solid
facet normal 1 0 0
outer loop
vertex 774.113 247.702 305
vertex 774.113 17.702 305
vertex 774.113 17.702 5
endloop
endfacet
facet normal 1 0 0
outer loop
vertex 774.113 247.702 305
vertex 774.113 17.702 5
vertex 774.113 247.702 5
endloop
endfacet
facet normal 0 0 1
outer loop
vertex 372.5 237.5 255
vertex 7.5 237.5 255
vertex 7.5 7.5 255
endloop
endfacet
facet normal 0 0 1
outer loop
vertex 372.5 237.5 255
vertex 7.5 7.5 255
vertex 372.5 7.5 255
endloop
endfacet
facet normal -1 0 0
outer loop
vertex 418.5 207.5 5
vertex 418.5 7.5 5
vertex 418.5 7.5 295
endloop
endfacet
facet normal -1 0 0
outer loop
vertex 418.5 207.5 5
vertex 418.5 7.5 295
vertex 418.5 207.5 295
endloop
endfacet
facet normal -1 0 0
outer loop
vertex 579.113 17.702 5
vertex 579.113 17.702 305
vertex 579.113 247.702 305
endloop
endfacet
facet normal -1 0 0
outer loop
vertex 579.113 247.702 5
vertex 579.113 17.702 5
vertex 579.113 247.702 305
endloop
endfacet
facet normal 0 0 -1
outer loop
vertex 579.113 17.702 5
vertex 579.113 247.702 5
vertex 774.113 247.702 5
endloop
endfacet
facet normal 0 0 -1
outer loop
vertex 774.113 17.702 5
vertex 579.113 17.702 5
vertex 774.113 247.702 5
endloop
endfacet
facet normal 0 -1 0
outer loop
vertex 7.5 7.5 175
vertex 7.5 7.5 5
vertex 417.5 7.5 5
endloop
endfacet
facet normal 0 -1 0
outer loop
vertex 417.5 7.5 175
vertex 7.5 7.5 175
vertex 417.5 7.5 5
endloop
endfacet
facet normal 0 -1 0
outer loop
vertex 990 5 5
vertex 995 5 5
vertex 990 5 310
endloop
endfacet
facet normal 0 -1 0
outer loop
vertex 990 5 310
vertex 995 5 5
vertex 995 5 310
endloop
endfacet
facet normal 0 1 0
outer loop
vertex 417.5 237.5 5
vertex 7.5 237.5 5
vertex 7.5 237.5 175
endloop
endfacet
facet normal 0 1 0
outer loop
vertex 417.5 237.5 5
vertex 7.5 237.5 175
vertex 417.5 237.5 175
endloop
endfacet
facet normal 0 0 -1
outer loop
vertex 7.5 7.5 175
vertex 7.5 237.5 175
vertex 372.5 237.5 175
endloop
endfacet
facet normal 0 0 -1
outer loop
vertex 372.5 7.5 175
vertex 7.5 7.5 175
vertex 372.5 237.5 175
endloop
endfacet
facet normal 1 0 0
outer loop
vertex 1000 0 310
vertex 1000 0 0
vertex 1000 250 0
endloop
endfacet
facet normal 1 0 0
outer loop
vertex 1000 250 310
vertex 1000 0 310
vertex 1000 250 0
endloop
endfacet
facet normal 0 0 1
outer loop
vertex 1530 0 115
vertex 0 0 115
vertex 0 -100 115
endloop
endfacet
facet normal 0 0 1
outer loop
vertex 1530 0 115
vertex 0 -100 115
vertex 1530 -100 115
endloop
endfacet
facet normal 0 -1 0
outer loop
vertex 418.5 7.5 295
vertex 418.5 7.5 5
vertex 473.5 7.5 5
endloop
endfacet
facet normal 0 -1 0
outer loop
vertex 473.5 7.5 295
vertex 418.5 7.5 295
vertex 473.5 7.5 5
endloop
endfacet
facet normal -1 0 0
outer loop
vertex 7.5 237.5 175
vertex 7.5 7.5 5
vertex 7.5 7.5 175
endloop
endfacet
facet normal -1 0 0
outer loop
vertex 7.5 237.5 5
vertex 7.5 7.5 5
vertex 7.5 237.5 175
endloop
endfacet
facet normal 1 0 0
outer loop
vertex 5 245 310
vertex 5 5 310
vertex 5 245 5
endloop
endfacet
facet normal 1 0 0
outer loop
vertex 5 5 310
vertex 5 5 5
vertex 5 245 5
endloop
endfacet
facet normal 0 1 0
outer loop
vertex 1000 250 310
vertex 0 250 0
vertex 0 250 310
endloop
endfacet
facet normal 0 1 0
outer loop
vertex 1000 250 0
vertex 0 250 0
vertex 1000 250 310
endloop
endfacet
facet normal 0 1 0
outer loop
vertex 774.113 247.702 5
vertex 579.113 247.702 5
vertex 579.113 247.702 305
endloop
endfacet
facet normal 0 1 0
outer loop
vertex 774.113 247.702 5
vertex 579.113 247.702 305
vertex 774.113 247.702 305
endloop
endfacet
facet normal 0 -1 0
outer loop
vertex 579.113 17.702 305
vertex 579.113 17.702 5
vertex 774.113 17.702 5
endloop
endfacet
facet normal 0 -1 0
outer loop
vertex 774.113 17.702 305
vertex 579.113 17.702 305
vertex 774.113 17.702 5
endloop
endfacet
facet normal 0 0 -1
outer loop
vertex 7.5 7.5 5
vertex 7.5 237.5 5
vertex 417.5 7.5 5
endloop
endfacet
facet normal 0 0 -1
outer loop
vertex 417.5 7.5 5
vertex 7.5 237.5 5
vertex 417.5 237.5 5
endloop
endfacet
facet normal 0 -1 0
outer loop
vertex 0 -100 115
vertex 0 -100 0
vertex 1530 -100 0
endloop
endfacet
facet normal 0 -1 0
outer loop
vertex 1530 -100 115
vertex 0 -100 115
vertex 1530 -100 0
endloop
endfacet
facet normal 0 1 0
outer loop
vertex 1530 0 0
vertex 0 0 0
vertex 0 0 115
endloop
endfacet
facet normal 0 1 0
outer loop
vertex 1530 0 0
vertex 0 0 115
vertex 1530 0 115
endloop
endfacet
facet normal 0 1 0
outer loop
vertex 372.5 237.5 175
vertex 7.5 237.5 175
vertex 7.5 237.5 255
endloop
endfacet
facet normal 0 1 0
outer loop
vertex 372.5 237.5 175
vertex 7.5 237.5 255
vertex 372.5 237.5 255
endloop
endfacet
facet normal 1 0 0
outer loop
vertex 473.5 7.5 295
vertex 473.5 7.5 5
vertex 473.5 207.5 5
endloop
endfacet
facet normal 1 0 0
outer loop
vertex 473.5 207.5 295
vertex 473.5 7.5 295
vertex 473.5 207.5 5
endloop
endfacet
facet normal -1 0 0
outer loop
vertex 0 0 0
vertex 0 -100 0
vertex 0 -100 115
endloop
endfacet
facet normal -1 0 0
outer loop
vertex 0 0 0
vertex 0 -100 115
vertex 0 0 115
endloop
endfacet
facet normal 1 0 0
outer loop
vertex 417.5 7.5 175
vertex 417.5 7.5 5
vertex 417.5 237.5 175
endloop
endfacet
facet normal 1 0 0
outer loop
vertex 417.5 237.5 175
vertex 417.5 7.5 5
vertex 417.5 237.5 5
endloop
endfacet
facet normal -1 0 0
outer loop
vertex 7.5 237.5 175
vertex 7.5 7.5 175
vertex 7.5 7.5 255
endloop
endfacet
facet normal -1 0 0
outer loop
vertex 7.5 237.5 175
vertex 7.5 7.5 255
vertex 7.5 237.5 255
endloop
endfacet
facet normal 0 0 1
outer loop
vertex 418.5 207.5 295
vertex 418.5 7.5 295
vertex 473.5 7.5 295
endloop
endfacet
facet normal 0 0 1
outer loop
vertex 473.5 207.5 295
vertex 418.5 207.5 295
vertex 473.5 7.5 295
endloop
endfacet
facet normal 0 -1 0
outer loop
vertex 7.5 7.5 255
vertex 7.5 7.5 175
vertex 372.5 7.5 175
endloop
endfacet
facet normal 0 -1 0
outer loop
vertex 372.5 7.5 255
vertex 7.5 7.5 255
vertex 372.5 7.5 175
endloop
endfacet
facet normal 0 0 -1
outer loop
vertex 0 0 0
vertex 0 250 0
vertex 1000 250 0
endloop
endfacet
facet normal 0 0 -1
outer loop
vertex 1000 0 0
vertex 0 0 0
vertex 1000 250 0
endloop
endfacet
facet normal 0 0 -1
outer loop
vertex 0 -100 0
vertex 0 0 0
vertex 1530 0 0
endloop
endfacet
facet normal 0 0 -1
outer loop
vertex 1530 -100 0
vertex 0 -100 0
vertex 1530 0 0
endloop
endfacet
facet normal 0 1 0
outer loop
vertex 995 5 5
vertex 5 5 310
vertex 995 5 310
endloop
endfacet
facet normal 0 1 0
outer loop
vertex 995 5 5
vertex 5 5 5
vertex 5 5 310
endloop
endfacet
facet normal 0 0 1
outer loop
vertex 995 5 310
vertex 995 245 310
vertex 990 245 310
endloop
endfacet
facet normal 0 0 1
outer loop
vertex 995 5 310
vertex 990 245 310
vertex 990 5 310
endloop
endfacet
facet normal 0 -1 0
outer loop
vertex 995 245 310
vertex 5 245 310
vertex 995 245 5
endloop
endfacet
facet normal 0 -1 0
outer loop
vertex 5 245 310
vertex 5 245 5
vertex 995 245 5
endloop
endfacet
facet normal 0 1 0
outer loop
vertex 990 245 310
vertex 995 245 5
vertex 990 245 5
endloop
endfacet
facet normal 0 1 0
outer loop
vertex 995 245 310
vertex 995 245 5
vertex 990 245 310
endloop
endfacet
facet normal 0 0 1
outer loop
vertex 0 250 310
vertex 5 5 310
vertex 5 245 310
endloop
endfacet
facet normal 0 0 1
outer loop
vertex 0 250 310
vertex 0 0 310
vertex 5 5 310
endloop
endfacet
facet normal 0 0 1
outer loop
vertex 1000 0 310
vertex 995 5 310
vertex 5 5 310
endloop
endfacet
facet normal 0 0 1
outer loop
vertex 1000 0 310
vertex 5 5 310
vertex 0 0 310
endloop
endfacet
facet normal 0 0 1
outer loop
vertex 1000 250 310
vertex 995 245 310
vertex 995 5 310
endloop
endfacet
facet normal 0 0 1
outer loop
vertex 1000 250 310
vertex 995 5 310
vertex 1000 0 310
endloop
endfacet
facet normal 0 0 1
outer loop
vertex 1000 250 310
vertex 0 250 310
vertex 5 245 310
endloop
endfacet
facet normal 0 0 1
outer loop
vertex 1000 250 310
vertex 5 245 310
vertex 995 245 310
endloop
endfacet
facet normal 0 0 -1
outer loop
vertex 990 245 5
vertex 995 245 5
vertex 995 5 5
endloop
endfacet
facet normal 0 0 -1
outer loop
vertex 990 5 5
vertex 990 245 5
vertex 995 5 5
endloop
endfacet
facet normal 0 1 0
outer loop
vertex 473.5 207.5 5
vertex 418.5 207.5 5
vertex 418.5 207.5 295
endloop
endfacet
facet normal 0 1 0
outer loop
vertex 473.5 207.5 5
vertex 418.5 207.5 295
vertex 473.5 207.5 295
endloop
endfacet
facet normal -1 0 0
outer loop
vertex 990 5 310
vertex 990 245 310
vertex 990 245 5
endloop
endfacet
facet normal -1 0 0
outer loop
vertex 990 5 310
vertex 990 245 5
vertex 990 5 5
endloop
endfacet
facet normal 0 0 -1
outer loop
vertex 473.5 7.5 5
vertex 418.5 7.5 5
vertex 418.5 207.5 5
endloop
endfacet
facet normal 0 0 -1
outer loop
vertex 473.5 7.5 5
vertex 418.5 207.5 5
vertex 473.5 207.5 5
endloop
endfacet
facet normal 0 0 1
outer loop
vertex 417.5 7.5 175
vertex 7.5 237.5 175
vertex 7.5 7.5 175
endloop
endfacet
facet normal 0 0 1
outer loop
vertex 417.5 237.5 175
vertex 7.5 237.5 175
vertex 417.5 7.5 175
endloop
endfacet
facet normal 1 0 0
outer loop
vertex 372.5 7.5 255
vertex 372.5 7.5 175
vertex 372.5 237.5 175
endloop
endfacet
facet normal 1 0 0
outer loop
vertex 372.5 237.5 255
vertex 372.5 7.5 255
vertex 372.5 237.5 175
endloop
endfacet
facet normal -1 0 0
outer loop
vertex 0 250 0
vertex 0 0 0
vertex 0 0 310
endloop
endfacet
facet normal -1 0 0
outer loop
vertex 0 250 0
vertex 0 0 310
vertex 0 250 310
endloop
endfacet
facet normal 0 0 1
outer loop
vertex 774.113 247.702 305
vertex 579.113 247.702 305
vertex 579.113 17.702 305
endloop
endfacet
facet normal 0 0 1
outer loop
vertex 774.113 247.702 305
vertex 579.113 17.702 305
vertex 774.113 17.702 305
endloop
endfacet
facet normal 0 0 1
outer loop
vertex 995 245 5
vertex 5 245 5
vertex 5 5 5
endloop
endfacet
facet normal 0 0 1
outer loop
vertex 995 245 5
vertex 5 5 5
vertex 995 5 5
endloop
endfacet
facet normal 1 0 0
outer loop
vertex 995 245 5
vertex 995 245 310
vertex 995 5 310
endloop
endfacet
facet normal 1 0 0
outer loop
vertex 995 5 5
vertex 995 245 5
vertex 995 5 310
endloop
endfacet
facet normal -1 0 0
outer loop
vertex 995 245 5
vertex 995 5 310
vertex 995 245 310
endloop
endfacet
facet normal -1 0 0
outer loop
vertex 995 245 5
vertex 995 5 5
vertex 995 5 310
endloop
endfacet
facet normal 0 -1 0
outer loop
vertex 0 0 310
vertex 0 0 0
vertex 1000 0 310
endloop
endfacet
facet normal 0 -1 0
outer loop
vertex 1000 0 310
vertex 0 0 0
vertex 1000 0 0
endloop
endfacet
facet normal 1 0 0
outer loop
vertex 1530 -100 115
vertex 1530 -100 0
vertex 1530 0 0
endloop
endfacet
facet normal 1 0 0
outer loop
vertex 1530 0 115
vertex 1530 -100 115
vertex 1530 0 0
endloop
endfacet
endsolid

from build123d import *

# Parameters (mm, degrees)
F0_W      = 1000
F0_H      = 250
F1_DEPTH  = 310
F2_T      = -5
F3_W      = 410
F3_H      = 230
F4_DEPTH  = 170
F5_W      = 365
F5_H      = 230
F6_DEPTH  = 80
F7_W      = 55
F7_H      = 200
F8_DEPTH  = 290
F9_W      = 195
F9_H      = 230
F10_DEPTH = 300
F11_W     = 1530
F11_H     = 100
F12_DEPTH = 115
F13_W     = 240
F13_H     = 305
F14_DEPTH = 5


with BuildPart() as f1:
    # F0 (on Top) → F1 (new body)
    with BuildSketch(Plane.XY):
        with Locations((500, 125)):
            Rectangle(F0_W, F0_H)
    extrude(amount=F1_DEPTH)

    # F2
    f2_openings = [f1.faces().sort_by_distance(p)[0] for p in [
        (500, 125, 310),
    ]]
    offset(amount=F2_T, openings=f2_openings)


with BuildPart() as f4:
    # F3 (on face) → F4 (new body)
    with BuildSketch(Plane.XY.offset(5)):
        with Locations((212.5, 122.5)):
            Rectangle(F3_W, F3_H)
    extrude(amount=F4_DEPTH)


with BuildPart() as f6:
    # F5 (on face) → F6 (new body)
    with BuildSketch(Plane.XY.offset(175)):
        with Locations((190, 122.5)):
            Rectangle(F5_W, F5_H)
    extrude(amount=F6_DEPTH)


with BuildPart() as f8:
    # F7 (on face) → F8 (new body)
    with BuildSketch(Plane.XY.offset(5)):
        with Locations((446, 107.5)):
            Rectangle(F7_W, F7_H)
    extrude(amount=F8_DEPTH)


with BuildPart() as f10:
    # F9 (on face) → F10 (new body)
    with BuildSketch(Plane.XY.offset(5)):
        with Locations((676.612673, 132.701575)):
            Rectangle(F9_W, F9_H)
    extrude(amount=F10_DEPTH)


with BuildPart() as f12:
    # F11 (on Top) → F12 (new body)
    with BuildSketch(Plane.XY):
        with Locations((765, -50)):
            Rectangle(F11_W, F11_H)
    extrude(amount=F12_DEPTH)


with BuildPart() as f14:
    # F13 (on face) → F14 (new body)
    with BuildSketch(Plane(origin=(995, 0, 0), x_dir=(0, -1, 0), z_dir=(-1, 0, 0))):
        with Locations((-125, 157.5)):
            Rectangle(F13_W, F13_H)
    extrude(amount=F14_DEPTH)


solid = Compound([f1.part, f4.part, f6.part, f8.part, f10.part, f12.part, f14.part])
